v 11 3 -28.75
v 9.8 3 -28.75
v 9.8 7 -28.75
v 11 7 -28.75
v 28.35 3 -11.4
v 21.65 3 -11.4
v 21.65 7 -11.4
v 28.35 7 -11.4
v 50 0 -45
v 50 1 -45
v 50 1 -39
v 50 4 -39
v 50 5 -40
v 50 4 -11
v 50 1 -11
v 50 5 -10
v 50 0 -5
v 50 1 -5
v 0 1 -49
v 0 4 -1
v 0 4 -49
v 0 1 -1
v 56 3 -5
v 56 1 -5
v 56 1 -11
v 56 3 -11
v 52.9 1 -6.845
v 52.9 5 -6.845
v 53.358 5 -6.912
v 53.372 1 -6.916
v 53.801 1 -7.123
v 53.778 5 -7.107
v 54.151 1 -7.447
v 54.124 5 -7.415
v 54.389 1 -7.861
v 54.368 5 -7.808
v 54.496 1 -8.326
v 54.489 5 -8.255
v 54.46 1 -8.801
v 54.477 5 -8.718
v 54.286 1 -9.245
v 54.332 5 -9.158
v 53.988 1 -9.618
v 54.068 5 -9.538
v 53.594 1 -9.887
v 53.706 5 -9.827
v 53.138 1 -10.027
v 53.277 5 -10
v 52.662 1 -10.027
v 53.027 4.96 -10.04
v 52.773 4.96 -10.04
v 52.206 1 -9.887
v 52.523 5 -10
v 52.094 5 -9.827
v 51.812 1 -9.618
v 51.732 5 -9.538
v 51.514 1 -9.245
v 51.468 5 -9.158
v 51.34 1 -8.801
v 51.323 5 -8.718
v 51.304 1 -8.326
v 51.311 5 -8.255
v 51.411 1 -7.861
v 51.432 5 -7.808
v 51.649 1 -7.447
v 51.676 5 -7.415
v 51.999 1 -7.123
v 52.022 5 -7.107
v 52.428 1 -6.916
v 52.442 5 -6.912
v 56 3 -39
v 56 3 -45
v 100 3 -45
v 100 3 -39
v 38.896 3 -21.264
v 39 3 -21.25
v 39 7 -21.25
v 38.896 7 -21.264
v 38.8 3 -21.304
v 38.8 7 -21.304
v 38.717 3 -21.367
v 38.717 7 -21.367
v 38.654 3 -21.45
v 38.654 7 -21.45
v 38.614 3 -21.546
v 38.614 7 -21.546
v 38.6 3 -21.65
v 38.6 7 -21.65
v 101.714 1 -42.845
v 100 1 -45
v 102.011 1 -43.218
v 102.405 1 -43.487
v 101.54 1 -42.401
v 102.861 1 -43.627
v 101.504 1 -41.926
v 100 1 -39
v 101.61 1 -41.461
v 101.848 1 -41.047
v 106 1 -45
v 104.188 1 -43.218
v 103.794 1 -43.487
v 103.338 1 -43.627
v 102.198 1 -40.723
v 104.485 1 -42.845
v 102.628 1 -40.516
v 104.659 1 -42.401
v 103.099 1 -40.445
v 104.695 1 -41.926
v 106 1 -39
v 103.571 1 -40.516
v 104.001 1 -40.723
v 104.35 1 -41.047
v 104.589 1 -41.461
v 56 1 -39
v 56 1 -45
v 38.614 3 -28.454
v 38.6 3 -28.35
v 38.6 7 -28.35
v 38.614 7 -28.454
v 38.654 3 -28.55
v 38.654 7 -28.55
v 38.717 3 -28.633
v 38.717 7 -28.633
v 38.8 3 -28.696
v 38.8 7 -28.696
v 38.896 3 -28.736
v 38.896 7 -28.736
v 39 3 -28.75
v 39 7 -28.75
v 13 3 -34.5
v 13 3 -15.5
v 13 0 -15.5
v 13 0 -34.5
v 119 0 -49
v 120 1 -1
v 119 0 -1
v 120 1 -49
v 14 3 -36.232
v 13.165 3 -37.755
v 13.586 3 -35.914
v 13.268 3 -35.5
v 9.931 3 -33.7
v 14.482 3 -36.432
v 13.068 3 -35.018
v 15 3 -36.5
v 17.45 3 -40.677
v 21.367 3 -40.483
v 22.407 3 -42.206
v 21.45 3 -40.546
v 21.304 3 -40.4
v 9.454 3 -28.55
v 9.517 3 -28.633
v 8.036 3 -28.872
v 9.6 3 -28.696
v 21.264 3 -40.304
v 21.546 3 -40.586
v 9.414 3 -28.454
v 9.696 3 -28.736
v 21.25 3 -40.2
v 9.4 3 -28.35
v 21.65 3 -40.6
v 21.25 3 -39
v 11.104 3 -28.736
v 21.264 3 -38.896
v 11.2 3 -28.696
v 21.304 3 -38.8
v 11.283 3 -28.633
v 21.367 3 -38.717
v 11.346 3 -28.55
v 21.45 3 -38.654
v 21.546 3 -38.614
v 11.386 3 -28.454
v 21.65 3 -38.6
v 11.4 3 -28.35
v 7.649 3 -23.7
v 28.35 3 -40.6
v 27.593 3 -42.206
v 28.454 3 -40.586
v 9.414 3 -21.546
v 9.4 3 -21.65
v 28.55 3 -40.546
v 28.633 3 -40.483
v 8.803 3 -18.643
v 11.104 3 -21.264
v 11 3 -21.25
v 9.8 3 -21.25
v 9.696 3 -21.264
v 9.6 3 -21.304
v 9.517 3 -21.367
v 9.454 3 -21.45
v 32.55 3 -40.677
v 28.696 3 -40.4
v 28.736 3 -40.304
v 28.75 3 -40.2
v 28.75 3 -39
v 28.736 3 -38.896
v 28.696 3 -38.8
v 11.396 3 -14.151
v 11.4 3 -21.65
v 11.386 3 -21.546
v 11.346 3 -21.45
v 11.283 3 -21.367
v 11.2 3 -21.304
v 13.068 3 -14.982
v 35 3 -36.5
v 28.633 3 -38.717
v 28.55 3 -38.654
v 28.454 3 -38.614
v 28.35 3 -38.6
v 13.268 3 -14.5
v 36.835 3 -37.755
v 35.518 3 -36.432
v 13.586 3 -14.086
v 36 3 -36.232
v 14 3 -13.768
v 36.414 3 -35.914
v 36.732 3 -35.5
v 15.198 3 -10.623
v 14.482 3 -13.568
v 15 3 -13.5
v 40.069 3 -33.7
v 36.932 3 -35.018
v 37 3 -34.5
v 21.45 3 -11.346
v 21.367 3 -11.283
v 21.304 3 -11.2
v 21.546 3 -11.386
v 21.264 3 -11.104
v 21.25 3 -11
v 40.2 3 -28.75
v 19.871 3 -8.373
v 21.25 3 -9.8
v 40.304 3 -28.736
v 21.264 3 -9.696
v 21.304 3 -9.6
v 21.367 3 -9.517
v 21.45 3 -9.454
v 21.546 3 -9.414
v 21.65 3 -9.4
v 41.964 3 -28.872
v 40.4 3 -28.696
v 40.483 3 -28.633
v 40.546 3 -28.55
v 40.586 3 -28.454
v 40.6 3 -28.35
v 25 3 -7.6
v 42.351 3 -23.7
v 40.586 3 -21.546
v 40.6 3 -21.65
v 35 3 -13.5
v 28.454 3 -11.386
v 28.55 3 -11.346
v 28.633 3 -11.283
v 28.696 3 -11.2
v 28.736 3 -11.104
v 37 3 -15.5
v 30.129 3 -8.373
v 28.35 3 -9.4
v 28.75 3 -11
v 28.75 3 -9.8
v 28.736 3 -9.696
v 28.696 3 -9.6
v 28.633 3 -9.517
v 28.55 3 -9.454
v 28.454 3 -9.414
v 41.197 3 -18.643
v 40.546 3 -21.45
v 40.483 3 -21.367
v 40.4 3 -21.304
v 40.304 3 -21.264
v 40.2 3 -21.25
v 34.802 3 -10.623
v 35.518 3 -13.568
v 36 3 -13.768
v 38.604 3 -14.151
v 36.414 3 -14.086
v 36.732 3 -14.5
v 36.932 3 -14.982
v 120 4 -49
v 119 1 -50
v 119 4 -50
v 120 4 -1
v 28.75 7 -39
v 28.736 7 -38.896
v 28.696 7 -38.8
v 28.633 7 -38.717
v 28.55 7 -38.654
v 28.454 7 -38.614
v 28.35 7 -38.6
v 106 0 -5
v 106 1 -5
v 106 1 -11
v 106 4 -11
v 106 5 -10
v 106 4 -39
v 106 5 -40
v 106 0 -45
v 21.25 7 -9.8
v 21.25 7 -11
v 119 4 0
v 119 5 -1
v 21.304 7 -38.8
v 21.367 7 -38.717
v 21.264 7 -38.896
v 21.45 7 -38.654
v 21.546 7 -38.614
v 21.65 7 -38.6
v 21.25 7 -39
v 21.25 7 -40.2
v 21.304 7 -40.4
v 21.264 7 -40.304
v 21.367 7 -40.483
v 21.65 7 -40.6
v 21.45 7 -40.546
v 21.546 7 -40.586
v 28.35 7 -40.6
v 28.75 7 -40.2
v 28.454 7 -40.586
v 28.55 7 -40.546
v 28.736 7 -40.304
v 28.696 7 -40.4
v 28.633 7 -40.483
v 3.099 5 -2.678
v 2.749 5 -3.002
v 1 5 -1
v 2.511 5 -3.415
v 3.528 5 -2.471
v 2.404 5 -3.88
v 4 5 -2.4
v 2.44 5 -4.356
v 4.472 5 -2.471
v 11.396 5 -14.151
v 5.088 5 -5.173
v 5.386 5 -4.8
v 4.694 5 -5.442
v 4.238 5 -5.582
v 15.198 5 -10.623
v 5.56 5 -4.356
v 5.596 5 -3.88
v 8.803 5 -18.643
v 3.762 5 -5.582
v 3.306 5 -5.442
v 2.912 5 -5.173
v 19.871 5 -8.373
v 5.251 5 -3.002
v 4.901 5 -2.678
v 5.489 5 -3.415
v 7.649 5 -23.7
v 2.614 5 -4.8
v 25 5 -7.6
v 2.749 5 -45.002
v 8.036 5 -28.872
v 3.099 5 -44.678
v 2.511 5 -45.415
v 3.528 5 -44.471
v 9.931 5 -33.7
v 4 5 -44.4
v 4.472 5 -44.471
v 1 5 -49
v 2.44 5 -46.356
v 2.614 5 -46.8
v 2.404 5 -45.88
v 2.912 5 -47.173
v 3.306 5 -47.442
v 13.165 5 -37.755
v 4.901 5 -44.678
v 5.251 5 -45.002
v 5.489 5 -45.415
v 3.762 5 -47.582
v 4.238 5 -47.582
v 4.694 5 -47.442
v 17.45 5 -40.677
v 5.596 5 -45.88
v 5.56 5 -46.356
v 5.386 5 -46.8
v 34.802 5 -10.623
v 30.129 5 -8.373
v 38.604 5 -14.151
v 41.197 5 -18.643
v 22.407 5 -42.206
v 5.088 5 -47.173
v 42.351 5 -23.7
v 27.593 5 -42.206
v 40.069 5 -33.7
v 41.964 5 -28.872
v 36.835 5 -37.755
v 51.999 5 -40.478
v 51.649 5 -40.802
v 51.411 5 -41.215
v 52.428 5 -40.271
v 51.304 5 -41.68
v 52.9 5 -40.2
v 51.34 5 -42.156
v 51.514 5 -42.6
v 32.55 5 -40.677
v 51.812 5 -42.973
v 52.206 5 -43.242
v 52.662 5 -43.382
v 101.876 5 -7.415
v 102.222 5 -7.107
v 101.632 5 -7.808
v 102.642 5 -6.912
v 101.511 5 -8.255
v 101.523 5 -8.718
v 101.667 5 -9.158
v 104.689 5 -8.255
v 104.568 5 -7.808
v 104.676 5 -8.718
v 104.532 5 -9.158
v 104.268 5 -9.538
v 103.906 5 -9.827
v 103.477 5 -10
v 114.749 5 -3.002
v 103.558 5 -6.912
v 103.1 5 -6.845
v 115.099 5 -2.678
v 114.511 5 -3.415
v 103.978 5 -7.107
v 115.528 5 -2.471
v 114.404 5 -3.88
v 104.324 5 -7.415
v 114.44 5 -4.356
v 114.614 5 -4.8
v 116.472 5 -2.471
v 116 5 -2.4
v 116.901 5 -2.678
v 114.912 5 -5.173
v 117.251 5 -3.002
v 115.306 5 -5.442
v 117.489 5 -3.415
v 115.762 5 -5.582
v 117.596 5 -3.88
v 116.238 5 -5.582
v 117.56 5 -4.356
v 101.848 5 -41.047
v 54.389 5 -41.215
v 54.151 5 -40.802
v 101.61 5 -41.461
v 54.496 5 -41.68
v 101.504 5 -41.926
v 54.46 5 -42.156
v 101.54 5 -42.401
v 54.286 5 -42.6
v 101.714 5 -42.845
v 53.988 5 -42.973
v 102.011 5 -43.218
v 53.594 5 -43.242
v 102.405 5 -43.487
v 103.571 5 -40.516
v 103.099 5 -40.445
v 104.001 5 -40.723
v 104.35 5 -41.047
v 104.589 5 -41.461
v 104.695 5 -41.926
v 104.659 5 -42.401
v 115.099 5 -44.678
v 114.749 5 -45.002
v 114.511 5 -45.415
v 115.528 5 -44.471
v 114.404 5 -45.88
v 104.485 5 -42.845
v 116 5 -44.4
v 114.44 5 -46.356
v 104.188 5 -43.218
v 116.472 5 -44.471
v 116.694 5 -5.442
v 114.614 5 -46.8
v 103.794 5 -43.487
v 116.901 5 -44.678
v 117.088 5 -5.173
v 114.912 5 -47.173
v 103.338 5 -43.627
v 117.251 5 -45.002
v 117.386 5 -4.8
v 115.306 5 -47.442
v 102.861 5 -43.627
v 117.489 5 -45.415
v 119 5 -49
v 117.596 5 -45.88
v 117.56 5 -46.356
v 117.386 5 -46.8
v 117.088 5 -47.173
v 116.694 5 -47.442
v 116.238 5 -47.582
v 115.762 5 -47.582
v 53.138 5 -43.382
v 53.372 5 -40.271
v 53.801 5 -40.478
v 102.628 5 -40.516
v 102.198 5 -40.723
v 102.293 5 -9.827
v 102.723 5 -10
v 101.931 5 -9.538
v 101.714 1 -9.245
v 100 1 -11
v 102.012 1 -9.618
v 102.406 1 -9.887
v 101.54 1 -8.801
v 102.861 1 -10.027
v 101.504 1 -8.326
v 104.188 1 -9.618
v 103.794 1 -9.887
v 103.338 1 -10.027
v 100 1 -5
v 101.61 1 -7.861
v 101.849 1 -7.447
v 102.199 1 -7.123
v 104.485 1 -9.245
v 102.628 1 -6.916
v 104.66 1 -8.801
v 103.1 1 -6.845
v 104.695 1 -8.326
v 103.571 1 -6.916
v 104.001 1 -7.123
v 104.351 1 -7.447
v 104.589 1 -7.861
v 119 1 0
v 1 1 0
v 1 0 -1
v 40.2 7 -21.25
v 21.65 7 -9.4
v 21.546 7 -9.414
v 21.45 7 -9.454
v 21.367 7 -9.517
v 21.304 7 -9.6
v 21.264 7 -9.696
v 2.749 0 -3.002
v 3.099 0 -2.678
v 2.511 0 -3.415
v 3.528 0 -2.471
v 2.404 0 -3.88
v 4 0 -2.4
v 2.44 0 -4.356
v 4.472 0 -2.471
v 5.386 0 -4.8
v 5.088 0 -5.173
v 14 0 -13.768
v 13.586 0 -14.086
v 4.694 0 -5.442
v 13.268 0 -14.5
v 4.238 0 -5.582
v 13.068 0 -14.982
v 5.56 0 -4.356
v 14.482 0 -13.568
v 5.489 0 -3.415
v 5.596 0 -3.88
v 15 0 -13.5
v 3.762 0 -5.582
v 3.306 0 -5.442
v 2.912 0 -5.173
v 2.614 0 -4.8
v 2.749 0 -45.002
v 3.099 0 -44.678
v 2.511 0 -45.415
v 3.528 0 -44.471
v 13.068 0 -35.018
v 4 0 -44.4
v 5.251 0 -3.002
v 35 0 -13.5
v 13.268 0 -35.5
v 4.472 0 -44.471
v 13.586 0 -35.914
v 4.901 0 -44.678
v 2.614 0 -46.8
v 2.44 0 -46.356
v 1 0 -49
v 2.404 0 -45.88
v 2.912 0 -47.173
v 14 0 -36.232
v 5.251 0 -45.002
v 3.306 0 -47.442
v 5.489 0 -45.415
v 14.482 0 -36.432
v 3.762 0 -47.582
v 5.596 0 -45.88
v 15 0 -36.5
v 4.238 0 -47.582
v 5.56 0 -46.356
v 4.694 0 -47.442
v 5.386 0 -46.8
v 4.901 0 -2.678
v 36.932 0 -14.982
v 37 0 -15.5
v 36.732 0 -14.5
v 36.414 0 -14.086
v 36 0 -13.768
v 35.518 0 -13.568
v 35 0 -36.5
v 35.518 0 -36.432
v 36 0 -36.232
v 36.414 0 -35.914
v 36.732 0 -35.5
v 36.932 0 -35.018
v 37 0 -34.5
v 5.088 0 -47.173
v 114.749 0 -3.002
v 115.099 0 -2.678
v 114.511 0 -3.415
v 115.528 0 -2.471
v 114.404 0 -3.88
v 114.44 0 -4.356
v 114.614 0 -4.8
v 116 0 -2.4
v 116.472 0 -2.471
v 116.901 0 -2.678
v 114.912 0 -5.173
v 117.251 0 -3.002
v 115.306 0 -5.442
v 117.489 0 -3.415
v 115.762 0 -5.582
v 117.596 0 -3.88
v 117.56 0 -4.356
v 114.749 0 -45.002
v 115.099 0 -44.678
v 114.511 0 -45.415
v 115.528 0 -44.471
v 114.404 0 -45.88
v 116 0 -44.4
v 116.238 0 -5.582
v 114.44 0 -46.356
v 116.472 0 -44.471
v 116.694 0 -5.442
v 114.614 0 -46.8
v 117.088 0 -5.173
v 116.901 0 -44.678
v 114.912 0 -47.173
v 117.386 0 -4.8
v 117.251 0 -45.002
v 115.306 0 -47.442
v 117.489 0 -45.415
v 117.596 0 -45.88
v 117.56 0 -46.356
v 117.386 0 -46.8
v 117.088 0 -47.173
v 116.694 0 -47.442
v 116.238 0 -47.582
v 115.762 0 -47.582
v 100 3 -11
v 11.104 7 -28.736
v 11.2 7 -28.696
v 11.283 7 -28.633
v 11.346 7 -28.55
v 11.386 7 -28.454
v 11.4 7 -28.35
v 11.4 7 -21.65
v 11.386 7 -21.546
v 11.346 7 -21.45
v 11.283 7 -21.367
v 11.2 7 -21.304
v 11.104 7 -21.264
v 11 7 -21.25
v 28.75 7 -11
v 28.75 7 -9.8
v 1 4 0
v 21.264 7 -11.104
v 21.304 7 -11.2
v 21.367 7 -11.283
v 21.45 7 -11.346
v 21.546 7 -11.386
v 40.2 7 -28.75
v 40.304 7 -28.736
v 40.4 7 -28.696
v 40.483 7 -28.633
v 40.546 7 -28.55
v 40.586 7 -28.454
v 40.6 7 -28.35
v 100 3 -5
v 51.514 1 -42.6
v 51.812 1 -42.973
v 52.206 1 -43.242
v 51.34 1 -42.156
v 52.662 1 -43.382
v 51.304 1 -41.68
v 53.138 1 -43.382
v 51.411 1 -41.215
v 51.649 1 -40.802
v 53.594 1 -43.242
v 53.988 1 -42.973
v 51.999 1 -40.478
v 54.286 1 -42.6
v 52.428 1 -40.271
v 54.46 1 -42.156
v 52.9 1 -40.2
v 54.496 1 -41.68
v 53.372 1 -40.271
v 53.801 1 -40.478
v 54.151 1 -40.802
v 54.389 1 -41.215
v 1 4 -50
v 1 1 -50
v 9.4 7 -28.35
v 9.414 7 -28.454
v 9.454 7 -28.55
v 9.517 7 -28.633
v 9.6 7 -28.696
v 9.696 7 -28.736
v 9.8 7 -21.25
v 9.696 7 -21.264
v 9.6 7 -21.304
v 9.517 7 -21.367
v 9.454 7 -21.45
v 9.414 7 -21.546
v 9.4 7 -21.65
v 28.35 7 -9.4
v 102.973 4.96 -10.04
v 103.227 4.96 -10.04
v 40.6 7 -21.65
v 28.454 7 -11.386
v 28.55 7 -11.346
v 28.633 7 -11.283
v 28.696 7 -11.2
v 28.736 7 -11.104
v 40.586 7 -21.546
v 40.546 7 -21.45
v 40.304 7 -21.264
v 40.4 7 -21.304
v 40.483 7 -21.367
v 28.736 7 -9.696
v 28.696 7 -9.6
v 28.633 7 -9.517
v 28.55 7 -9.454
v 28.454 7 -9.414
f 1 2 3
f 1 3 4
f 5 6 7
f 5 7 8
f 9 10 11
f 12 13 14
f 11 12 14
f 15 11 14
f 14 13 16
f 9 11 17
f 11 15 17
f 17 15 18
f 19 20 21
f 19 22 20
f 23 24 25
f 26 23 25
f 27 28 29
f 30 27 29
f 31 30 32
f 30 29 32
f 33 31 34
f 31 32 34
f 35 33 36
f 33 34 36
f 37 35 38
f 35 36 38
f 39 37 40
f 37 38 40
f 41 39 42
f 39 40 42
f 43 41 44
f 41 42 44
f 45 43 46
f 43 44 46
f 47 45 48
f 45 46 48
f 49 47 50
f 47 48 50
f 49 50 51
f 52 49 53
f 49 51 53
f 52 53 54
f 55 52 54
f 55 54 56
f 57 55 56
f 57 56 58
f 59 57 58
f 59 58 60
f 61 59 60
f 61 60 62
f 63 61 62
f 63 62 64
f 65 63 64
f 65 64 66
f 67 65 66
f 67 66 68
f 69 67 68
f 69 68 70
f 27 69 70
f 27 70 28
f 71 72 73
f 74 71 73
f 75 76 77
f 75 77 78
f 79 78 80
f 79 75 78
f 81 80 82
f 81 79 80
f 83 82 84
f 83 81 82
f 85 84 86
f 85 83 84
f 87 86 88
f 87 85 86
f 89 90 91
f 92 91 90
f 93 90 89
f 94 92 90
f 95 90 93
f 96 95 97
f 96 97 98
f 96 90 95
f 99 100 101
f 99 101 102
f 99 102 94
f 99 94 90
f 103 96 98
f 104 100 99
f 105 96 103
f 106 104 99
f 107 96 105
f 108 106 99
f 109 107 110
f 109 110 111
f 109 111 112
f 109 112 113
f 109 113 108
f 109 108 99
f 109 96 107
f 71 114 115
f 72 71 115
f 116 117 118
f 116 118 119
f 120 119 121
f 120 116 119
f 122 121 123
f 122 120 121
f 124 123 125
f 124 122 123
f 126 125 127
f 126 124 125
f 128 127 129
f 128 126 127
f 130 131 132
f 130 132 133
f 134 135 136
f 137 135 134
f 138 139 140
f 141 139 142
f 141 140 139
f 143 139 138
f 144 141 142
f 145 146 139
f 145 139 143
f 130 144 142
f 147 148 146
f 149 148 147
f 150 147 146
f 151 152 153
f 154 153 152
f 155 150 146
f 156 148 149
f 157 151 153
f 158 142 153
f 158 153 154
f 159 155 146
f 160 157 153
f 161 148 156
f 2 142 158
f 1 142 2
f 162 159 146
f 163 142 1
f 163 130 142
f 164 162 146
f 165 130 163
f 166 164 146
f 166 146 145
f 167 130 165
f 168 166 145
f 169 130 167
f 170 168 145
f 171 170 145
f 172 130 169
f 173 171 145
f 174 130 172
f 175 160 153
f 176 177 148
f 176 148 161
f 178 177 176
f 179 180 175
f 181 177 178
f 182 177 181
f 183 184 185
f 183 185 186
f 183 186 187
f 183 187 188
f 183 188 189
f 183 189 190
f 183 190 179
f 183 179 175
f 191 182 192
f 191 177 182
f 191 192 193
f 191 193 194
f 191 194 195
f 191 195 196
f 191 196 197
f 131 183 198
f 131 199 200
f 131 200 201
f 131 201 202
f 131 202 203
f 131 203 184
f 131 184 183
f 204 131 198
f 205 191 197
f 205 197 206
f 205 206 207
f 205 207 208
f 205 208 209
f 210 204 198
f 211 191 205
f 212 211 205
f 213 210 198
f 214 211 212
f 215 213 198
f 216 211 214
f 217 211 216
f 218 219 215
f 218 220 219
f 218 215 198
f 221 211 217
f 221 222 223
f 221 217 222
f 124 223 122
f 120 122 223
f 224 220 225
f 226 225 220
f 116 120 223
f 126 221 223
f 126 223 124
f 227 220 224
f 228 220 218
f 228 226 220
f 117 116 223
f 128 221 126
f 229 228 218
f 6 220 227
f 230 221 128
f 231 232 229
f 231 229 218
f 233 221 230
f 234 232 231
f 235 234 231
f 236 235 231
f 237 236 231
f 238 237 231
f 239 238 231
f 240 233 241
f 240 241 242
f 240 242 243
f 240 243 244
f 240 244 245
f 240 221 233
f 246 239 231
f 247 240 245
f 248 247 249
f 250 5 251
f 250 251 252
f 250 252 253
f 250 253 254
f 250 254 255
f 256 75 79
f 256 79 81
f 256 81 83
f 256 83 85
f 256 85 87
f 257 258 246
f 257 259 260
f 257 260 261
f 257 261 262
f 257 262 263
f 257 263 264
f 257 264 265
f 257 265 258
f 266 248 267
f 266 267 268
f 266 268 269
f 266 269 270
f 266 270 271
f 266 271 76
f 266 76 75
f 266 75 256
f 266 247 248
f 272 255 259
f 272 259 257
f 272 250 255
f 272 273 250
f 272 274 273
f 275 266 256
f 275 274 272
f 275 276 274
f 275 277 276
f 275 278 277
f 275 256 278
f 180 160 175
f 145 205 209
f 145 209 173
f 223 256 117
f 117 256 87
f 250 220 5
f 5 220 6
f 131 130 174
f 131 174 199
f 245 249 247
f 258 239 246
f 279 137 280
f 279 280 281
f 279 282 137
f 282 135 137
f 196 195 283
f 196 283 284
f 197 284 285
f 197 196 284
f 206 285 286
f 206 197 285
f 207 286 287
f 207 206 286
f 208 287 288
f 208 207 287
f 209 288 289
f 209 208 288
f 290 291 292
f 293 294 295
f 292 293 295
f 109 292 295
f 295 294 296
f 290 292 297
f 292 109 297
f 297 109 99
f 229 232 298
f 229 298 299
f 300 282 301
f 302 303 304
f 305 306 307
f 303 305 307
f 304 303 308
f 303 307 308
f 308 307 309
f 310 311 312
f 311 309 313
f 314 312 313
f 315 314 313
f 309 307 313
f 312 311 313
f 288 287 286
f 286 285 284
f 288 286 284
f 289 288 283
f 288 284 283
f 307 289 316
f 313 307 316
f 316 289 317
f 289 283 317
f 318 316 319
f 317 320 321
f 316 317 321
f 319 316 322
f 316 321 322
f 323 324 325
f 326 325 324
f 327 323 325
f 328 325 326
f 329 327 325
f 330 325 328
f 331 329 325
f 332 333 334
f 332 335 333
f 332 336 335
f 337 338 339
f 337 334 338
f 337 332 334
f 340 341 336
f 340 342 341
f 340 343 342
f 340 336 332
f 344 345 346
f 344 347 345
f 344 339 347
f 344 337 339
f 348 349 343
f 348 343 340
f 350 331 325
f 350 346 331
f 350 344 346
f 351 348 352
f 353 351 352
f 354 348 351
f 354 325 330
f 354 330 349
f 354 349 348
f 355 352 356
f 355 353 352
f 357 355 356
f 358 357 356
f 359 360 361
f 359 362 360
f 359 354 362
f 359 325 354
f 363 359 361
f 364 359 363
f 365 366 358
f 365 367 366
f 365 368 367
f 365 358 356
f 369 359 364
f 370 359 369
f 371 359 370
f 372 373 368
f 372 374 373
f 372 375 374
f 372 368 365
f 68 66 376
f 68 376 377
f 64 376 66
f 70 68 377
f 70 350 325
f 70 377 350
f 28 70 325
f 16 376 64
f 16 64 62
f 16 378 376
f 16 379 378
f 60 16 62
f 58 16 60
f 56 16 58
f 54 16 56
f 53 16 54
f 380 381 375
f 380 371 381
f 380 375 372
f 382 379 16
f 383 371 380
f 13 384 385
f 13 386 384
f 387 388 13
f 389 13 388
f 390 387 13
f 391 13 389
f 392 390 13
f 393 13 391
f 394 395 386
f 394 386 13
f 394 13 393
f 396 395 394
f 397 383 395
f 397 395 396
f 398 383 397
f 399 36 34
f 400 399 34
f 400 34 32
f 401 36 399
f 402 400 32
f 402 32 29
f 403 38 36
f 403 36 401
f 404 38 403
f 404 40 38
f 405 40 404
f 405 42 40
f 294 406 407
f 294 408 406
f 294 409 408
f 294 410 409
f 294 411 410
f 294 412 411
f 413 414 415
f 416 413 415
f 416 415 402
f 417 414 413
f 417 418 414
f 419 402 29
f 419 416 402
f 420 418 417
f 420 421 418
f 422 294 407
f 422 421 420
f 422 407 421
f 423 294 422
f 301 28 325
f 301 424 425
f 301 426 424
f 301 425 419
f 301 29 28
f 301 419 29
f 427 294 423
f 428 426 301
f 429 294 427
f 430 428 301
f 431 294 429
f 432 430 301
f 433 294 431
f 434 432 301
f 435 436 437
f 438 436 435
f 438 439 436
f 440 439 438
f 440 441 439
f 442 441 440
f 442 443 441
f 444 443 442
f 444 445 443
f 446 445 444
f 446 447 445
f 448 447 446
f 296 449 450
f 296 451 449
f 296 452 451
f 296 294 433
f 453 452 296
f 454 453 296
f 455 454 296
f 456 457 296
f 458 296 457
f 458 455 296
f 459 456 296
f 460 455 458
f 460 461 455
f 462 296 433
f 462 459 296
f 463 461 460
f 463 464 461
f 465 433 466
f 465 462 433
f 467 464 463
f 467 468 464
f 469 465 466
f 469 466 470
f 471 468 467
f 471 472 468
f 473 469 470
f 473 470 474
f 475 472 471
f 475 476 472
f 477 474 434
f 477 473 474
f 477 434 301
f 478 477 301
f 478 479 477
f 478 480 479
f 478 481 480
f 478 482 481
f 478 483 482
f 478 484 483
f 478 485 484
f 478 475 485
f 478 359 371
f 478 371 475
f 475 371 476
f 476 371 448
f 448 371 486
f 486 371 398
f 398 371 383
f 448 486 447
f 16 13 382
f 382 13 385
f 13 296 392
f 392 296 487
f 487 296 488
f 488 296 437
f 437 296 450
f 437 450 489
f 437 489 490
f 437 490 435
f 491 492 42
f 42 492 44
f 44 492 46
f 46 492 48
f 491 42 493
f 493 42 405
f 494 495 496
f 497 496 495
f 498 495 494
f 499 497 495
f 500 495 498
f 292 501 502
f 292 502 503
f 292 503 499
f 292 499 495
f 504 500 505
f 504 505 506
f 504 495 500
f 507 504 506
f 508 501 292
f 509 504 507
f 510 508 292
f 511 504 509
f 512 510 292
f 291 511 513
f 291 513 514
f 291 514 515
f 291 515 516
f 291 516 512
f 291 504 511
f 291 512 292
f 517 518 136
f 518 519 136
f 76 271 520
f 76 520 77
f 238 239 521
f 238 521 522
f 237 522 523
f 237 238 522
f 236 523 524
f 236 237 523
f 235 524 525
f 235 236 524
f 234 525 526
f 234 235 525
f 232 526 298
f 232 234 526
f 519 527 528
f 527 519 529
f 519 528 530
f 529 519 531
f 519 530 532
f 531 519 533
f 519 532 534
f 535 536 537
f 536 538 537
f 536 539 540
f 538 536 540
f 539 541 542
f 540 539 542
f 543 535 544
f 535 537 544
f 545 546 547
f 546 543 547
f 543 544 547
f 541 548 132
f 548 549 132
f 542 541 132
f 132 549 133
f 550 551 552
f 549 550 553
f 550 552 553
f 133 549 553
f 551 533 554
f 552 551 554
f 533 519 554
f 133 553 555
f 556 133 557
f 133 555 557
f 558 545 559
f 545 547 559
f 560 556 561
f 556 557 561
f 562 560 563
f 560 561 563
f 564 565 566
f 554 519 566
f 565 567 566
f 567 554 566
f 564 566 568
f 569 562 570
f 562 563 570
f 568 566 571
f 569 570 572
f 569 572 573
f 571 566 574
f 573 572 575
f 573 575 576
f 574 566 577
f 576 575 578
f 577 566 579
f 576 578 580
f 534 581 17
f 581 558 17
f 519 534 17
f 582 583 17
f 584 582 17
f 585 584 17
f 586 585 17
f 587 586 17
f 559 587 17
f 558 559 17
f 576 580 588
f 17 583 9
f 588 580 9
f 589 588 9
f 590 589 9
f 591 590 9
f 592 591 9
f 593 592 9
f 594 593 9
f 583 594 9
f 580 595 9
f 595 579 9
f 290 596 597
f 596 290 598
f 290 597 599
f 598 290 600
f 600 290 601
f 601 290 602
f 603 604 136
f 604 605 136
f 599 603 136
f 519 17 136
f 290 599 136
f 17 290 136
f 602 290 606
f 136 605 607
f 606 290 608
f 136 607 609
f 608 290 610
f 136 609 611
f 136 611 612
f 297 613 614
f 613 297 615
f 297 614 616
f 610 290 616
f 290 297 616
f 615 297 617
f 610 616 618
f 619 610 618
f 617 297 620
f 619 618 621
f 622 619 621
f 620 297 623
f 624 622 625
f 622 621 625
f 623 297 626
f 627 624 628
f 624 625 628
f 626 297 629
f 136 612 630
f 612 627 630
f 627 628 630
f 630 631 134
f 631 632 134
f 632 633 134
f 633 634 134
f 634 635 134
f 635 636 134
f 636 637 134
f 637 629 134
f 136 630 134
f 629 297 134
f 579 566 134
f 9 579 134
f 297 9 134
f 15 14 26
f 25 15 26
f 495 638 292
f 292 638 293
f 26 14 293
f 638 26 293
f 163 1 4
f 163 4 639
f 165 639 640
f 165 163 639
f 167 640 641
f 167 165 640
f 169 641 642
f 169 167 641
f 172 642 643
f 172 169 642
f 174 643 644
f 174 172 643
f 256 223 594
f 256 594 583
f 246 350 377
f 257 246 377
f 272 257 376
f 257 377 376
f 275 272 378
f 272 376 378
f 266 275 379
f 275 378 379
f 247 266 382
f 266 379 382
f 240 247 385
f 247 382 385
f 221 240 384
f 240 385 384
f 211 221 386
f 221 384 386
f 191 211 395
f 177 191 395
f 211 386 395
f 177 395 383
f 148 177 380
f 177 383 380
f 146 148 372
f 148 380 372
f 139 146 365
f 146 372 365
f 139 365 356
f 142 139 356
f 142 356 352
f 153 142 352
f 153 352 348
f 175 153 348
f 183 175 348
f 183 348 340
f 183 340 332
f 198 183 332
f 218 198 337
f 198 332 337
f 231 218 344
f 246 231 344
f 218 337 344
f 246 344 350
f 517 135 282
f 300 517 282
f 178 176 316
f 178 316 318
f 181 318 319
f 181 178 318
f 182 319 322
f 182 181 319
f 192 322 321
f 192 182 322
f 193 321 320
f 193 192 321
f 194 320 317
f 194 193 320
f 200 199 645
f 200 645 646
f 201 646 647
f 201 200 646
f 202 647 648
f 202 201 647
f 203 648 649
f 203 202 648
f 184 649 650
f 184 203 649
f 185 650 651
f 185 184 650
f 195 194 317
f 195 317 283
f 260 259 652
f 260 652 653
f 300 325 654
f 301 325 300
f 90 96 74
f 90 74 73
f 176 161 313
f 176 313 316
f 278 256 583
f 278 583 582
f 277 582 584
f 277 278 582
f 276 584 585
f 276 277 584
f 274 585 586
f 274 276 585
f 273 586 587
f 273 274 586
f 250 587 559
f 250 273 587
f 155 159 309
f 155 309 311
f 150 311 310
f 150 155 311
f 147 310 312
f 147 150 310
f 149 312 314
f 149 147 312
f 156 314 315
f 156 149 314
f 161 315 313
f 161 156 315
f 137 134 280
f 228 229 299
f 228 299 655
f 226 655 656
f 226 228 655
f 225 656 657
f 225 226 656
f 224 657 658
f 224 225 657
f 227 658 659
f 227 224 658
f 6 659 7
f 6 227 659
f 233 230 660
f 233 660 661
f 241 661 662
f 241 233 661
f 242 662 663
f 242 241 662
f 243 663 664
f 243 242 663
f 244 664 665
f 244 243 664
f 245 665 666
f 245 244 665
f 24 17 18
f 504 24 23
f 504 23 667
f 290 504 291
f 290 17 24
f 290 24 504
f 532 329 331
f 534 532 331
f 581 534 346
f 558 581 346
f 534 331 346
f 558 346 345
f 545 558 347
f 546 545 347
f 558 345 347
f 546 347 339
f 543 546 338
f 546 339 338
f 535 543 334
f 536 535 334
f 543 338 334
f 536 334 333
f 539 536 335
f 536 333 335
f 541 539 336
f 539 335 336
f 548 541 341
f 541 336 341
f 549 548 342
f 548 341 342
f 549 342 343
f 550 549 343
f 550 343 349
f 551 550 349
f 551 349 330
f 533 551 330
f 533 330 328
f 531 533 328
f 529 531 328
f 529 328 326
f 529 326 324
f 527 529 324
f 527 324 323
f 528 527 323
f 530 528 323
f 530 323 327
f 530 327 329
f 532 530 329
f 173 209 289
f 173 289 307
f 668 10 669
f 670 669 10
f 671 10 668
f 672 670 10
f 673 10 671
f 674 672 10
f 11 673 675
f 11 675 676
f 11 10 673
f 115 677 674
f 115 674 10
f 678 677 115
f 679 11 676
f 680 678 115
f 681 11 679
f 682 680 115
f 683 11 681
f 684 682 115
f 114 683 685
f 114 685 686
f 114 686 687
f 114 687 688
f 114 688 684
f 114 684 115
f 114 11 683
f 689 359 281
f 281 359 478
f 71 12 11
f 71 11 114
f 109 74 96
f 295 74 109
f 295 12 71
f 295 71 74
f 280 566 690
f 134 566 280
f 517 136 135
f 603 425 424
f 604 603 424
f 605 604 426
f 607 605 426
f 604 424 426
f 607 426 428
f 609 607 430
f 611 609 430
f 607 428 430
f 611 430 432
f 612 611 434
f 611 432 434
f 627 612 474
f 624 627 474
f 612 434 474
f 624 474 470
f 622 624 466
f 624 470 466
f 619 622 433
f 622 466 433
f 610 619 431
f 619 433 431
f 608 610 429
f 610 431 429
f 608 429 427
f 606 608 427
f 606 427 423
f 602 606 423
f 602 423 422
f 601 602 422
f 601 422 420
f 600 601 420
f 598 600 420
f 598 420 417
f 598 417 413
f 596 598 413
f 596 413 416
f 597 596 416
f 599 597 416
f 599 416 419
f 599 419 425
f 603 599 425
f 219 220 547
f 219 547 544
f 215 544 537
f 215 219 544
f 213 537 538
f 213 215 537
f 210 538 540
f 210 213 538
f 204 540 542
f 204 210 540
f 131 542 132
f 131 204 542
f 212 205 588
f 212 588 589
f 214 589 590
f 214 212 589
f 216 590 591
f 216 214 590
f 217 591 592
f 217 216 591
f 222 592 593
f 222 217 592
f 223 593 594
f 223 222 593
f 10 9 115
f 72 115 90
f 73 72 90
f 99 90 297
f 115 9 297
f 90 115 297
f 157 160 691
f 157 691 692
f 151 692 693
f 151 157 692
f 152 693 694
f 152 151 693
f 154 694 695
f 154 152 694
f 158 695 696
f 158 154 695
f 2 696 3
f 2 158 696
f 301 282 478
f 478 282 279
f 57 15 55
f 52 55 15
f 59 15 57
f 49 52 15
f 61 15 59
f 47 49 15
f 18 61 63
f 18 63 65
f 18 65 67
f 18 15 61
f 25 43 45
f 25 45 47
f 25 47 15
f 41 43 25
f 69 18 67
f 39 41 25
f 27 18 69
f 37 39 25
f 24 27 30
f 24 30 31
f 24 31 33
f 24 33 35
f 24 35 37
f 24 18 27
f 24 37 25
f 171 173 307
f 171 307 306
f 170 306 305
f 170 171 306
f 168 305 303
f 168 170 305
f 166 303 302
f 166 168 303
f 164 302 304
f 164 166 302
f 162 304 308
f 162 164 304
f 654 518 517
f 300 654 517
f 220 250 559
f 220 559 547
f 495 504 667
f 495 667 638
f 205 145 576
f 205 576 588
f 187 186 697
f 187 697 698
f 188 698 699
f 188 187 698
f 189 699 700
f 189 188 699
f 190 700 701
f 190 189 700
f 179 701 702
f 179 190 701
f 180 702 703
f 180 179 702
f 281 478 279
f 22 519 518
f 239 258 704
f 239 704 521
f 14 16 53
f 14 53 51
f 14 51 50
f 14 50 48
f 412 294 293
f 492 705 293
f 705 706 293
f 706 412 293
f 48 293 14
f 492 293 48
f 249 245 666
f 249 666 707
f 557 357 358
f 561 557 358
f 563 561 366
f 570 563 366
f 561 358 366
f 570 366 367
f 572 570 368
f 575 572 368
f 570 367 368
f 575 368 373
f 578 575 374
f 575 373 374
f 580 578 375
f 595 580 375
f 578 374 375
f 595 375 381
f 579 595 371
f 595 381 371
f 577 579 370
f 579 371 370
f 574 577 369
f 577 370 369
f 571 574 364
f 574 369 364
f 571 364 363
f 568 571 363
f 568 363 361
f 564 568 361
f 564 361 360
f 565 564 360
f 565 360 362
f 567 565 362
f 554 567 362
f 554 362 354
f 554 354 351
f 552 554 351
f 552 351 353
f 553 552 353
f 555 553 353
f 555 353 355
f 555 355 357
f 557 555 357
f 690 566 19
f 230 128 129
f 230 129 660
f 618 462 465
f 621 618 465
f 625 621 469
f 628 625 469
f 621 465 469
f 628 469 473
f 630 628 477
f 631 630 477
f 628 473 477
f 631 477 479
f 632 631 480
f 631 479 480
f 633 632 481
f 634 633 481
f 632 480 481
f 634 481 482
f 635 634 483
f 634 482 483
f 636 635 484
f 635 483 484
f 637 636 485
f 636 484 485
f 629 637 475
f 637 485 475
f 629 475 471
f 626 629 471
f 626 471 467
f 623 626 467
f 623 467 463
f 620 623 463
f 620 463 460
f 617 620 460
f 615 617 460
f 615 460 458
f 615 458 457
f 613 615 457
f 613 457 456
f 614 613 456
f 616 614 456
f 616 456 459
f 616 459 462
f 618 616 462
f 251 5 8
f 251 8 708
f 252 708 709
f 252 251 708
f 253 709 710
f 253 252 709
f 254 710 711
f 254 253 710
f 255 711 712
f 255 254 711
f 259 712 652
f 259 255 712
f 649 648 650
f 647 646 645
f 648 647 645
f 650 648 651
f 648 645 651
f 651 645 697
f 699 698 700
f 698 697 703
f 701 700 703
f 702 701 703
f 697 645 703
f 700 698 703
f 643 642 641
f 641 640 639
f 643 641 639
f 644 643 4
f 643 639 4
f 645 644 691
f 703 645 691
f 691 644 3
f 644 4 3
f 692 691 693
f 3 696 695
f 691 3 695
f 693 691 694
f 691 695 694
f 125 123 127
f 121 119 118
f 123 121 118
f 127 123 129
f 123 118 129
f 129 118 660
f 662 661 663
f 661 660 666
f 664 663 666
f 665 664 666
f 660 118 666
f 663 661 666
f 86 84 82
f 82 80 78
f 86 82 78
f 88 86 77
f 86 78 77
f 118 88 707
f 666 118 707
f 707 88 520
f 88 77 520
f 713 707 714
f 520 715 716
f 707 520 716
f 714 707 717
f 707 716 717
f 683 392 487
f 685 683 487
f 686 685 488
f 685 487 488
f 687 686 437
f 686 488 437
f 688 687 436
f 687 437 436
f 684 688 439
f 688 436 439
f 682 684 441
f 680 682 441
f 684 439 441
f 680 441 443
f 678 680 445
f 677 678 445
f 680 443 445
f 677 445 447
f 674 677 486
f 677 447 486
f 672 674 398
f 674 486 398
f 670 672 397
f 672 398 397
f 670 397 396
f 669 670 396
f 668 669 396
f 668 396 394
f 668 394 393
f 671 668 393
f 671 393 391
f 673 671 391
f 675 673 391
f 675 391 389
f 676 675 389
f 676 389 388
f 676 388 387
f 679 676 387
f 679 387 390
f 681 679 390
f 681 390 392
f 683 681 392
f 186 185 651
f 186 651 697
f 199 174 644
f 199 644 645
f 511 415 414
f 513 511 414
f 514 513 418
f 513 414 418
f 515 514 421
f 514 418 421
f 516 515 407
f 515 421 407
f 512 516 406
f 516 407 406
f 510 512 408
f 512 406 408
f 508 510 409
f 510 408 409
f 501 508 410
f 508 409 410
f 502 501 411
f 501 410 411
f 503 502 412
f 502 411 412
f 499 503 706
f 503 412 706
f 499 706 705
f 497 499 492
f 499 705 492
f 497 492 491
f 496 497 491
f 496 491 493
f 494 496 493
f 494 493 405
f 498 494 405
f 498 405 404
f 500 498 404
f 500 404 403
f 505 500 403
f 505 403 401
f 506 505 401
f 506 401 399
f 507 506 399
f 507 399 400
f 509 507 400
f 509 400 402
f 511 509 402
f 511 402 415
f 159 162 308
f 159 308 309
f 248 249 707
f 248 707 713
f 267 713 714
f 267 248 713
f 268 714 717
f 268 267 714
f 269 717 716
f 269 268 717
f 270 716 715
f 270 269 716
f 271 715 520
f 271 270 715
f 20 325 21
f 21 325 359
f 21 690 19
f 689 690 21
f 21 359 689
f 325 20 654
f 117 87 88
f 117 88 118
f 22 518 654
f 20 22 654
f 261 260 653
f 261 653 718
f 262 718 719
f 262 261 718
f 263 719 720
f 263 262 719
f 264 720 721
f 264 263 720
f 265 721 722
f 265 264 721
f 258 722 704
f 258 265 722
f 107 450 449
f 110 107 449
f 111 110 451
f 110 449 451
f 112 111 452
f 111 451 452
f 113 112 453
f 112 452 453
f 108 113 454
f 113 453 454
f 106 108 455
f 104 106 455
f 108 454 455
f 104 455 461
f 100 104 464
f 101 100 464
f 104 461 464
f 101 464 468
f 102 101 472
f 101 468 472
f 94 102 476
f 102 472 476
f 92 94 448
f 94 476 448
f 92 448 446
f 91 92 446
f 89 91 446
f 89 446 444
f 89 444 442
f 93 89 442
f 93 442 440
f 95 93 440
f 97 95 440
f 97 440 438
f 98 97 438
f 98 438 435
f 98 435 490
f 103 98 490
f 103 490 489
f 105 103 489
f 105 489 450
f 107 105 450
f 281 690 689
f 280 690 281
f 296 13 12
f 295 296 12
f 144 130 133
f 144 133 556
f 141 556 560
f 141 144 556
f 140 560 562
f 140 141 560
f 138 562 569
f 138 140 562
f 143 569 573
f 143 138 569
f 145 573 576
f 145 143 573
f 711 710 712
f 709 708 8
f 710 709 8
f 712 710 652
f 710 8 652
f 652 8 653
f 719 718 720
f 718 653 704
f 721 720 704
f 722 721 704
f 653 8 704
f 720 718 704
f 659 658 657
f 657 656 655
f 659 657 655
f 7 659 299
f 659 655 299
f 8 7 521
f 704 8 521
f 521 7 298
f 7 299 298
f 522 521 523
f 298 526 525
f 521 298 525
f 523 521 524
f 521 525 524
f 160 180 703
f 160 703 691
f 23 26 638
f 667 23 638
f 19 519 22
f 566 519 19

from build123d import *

# Parameters (mm, degrees)
SKETCH1_W           = 120
SKETCH1_H           = 50
BOSS_EXTRUDE1_DEPTH = 5
SKETCH4_R           = 17.4
CUT_EXTRUDE3_DEPTH  = 2
CUT_EXTRUDE2_DEPTH  = 5
BOSS_EXTRUDE2_DEPTH = 4
CIRPATTERN1_COUNT   = 4
SKETCH6_R           = 1.6
CUT_EXTRUDE4_DEPTH  = 131.096118313
SKETCH8_W           = 56
SKETCH8_H           = 28
CUT_EXTRUDE5_DEPTH  = 131.096118313
SKETCH9_W           = 44
SKETCH9_H           = 40
CUT_EXTRUDE6_DEPTH  = 3
SKETCH10_W          = 56
SKETCH10_H          = 40
CUT_EXTRUDE7_DEPTH  = 1
SKETCH11_R          = 1.6
CUT_EXTRUDE8_DEPTH  = 131.096118313
CHAMFER1_SIZE       = 1
CHAMFER2_SIZE       = 1


with BuildPart() as part:
    # Sketch1 → Boss-Extrude1 (new body)
    with BuildSketch(Plane(origin=(0, 0, 0), x_dir=(1, 0, 0), z_dir=(0, 1, 0))):
        with Locations((60, 25)):
            Rectangle(SKETCH1_W, SKETCH1_H)
    extrude(amount=BOSS_EXTRUDE1_DEPTH)

    # Sketch4 → Cut-Extrude3 (cut)
    with BuildSketch(Plane(origin=(0, 5, 0), x_dir=(1, 0, 0), z_dir=(0, 1, 0))):
        with Locations(Location((25, 25, 0), (0, 0, 270))):
            Circle(SKETCH4_R)
    extrude(amount=-CUT_EXTRUDE3_DEPTH, mode=Mode.SUBTRACT)

    # Sketch3 → Cut-Extrude2 (cut)
    with BuildSketch(Plane(origin=(0, 5, 0), x_dir=(1, 0, 0), z_dir=(0, 1, 0))):
        with BuildLine():
            Line((15, 36.5), (35, 36.5))
            ThreePointArc((35, 36.5), (36.414213562, 35.914213562), (37, 34.5))
            Line((37, 34.5), (37, 15.5))
            ThreePointArc((37, 15.5), (36.414213562, 14.085786438), (35, 13.5))
            Line((35, 13.5), (15, 13.5))
            ThreePointArc((15, 13.5), (13.585786438, 14.085786438), (13, 15.5))
            Line((13, 15.5), (13, 34.5))
            ThreePointArc((13, 34.5), (13.585786438, 35.914213562), (15, 36.5))
        make_face()
    extrude(amount=-CUT_EXTRUDE2_DEPTH, mode=Mode.SUBTRACT)

    # Sketch5 → Boss-Extrude2 (add)
    with BuildSketch(Plane(origin=(0, 3, 0), x_dir=(1, 0, 0), z_dir=(0, 1, 0))):
        with BuildLine():
            Line((9.8, 28.75), (11, 28.75))
            ThreePointArc((11, 28.75), (11.282842712, 28.632842712), (11.4, 28.35))
            Line((11.4, 28.35), (11.4, 21.65))
            ThreePointArc((11.4, 21.65), (11.282842712, 21.367157288), (11, 21.25))
            Line((11, 21.25), (9.8, 21.25))
            ThreePointArc((9.8, 21.25), (9.517157288, 21.367157288), (9.4, 21.65))
            Line((9.4, 21.65), (9.4, 28.35))
            ThreePointArc((9.4, 28.35), (9.517157288, 28.632842712), (9.8, 28.75))
        make_face()
    boss_extrude2 = extrude(amount=BOSS_EXTRUDE2_DEPTH)

    # CirPattern1: Boss-Extrude2 ×4 about axis
    cirpattern1_axis = Axis((25, 0, -25), (0, 1, 0))
    for i in range(1, CIRPATTERN1_COUNT):
        add(boss_extrude2.rotate(cirpattern1_axis, i * 360 / CIRPATTERN1_COUNT))

    # Sketch6 → Cut-Extrude4 (cut, through all)
    with BuildSketch(Plane(origin=(0, 5, 0), x_dir=(1, 0, 0), z_dir=(0, 1, 0))):
        with Locations(Location((4, 46, 0), (0, 0, 270))):
            Circle(SKETCH6_R)
        with Locations(Location((116, 46, 0), (0, 0, 270))):
            Circle(SKETCH6_R)
        with Locations(Location((116, 4, 0), (0, 0, 270))):
            Circle(SKETCH6_R)
        with Locations(Location((4, 4, 0), (0, 0, 270))):
            Circle(SKETCH6_R)
    extrude(amount=-CUT_EXTRUDE4_DEPTH, mode=Mode.SUBTRACT)

    # Sketch8 → Cut-Extrude5 (cut, through all)
    with BuildSketch(Plane(origin=(0, 5, 0), x_dir=(1, 0, 0), z_dir=(0, 1, 0))):
        with Locations((78, 25)):
            Rectangle(SKETCH8_W, SKETCH8_H)
    extrude(amount=-CUT_EXTRUDE5_DEPTH, mode=Mode.SUBTRACT)

    # Sketch9 → Cut-Extrude6 (cut)
    with BuildSketch(Plane(origin=(0, 0, 0), x_dir=(1, 0, 0), z_dir=(0, 1, 0))):
        with Locations((78, 25)):
            Rectangle(SKETCH9_W, SKETCH9_H)
    extrude(amount=CUT_EXTRUDE6_DEPTH, mode=Mode.SUBTRACT)

    # Sketch10 → Cut-Extrude7 (cut)
    with BuildSketch(Plane.XZ):
        with Locations((78, -25)):
            Rectangle(SKETCH10_W, SKETCH10_H)
    extrude(amount=-CUT_EXTRUDE7_DEPTH, mode=Mode.SUBTRACT)

    # Sketch11 → Cut-Extrude8 (cut, through all)
    with BuildSketch(Plane(origin=(0, 5, 0), x_dir=(1, 0, 0), z_dir=(0, 1, 0))):
        with Locations(Location((52.9, 41.8, 0), (0, 0, 270))):
            Circle(SKETCH11_R)
        with Locations(Location((103.099401804, 42.045068405, 0), (0, 0, 270))):
            Circle(SKETCH11_R)
        with Locations(Location((103.099812841, 8.445068408, 0), (0, 0, 270))):
            Circle(SKETCH11_R)
        with Locations(Location((52.9, 8.445068408, 0), (0, 0, 270))):
            Circle(SKETCH11_R)
    extrude(amount=-CUT_EXTRUDE8_DEPTH, mode=Mode.SUBTRACT)

    # Chamfer1
    chamfer1_edges = [part.edges().sort_by_distance(p)[0] for p in [
        (120, 5, -25),
        (60, 5, -50),
        (0, 5, -25),
        (60, 0, -50),
        (120, 0, -25),
        (60, 0, 0),
        (0, 0, -25),
        (0, 2.5, -50),
        (120, 2.5, -50),
        (120, 2.5, 0),
        (0, 2.5, 0),
        (60, 5, 0),
    ]]
    chamfer(chamfer1_edges, length=CHAMFER1_SIZE)

    # Chamfer2
    # the kernel refuses this chamfer: 1 mm, written as the material it takes off along each edge
    with BuildSketch(Plane(origin=(106, 5, -11), x_dir=(0, 0.02749587661058651, 0.9996219169112968), z_dir=(-1, 0, 0)), Plane(origin=(50, 5, -39), x_dir=(0, 0.027495876610586414, -0.9996219169112968), z_dir=(1, 0, 0))) as chamfer2_piece_1:
        Polygon((CHAMFER2_SIZE * 0.999621916911, -CHAMFER2_SIZE * 0.0274958766106), (-CHAMFER2_SIZE * 0.0274958766106, -CHAMFER2_SIZE * 0.999621916911), (0, 0), align=None)
    extrude(amount=56, mode=Mode.SUBTRACT)


solid = part.part
